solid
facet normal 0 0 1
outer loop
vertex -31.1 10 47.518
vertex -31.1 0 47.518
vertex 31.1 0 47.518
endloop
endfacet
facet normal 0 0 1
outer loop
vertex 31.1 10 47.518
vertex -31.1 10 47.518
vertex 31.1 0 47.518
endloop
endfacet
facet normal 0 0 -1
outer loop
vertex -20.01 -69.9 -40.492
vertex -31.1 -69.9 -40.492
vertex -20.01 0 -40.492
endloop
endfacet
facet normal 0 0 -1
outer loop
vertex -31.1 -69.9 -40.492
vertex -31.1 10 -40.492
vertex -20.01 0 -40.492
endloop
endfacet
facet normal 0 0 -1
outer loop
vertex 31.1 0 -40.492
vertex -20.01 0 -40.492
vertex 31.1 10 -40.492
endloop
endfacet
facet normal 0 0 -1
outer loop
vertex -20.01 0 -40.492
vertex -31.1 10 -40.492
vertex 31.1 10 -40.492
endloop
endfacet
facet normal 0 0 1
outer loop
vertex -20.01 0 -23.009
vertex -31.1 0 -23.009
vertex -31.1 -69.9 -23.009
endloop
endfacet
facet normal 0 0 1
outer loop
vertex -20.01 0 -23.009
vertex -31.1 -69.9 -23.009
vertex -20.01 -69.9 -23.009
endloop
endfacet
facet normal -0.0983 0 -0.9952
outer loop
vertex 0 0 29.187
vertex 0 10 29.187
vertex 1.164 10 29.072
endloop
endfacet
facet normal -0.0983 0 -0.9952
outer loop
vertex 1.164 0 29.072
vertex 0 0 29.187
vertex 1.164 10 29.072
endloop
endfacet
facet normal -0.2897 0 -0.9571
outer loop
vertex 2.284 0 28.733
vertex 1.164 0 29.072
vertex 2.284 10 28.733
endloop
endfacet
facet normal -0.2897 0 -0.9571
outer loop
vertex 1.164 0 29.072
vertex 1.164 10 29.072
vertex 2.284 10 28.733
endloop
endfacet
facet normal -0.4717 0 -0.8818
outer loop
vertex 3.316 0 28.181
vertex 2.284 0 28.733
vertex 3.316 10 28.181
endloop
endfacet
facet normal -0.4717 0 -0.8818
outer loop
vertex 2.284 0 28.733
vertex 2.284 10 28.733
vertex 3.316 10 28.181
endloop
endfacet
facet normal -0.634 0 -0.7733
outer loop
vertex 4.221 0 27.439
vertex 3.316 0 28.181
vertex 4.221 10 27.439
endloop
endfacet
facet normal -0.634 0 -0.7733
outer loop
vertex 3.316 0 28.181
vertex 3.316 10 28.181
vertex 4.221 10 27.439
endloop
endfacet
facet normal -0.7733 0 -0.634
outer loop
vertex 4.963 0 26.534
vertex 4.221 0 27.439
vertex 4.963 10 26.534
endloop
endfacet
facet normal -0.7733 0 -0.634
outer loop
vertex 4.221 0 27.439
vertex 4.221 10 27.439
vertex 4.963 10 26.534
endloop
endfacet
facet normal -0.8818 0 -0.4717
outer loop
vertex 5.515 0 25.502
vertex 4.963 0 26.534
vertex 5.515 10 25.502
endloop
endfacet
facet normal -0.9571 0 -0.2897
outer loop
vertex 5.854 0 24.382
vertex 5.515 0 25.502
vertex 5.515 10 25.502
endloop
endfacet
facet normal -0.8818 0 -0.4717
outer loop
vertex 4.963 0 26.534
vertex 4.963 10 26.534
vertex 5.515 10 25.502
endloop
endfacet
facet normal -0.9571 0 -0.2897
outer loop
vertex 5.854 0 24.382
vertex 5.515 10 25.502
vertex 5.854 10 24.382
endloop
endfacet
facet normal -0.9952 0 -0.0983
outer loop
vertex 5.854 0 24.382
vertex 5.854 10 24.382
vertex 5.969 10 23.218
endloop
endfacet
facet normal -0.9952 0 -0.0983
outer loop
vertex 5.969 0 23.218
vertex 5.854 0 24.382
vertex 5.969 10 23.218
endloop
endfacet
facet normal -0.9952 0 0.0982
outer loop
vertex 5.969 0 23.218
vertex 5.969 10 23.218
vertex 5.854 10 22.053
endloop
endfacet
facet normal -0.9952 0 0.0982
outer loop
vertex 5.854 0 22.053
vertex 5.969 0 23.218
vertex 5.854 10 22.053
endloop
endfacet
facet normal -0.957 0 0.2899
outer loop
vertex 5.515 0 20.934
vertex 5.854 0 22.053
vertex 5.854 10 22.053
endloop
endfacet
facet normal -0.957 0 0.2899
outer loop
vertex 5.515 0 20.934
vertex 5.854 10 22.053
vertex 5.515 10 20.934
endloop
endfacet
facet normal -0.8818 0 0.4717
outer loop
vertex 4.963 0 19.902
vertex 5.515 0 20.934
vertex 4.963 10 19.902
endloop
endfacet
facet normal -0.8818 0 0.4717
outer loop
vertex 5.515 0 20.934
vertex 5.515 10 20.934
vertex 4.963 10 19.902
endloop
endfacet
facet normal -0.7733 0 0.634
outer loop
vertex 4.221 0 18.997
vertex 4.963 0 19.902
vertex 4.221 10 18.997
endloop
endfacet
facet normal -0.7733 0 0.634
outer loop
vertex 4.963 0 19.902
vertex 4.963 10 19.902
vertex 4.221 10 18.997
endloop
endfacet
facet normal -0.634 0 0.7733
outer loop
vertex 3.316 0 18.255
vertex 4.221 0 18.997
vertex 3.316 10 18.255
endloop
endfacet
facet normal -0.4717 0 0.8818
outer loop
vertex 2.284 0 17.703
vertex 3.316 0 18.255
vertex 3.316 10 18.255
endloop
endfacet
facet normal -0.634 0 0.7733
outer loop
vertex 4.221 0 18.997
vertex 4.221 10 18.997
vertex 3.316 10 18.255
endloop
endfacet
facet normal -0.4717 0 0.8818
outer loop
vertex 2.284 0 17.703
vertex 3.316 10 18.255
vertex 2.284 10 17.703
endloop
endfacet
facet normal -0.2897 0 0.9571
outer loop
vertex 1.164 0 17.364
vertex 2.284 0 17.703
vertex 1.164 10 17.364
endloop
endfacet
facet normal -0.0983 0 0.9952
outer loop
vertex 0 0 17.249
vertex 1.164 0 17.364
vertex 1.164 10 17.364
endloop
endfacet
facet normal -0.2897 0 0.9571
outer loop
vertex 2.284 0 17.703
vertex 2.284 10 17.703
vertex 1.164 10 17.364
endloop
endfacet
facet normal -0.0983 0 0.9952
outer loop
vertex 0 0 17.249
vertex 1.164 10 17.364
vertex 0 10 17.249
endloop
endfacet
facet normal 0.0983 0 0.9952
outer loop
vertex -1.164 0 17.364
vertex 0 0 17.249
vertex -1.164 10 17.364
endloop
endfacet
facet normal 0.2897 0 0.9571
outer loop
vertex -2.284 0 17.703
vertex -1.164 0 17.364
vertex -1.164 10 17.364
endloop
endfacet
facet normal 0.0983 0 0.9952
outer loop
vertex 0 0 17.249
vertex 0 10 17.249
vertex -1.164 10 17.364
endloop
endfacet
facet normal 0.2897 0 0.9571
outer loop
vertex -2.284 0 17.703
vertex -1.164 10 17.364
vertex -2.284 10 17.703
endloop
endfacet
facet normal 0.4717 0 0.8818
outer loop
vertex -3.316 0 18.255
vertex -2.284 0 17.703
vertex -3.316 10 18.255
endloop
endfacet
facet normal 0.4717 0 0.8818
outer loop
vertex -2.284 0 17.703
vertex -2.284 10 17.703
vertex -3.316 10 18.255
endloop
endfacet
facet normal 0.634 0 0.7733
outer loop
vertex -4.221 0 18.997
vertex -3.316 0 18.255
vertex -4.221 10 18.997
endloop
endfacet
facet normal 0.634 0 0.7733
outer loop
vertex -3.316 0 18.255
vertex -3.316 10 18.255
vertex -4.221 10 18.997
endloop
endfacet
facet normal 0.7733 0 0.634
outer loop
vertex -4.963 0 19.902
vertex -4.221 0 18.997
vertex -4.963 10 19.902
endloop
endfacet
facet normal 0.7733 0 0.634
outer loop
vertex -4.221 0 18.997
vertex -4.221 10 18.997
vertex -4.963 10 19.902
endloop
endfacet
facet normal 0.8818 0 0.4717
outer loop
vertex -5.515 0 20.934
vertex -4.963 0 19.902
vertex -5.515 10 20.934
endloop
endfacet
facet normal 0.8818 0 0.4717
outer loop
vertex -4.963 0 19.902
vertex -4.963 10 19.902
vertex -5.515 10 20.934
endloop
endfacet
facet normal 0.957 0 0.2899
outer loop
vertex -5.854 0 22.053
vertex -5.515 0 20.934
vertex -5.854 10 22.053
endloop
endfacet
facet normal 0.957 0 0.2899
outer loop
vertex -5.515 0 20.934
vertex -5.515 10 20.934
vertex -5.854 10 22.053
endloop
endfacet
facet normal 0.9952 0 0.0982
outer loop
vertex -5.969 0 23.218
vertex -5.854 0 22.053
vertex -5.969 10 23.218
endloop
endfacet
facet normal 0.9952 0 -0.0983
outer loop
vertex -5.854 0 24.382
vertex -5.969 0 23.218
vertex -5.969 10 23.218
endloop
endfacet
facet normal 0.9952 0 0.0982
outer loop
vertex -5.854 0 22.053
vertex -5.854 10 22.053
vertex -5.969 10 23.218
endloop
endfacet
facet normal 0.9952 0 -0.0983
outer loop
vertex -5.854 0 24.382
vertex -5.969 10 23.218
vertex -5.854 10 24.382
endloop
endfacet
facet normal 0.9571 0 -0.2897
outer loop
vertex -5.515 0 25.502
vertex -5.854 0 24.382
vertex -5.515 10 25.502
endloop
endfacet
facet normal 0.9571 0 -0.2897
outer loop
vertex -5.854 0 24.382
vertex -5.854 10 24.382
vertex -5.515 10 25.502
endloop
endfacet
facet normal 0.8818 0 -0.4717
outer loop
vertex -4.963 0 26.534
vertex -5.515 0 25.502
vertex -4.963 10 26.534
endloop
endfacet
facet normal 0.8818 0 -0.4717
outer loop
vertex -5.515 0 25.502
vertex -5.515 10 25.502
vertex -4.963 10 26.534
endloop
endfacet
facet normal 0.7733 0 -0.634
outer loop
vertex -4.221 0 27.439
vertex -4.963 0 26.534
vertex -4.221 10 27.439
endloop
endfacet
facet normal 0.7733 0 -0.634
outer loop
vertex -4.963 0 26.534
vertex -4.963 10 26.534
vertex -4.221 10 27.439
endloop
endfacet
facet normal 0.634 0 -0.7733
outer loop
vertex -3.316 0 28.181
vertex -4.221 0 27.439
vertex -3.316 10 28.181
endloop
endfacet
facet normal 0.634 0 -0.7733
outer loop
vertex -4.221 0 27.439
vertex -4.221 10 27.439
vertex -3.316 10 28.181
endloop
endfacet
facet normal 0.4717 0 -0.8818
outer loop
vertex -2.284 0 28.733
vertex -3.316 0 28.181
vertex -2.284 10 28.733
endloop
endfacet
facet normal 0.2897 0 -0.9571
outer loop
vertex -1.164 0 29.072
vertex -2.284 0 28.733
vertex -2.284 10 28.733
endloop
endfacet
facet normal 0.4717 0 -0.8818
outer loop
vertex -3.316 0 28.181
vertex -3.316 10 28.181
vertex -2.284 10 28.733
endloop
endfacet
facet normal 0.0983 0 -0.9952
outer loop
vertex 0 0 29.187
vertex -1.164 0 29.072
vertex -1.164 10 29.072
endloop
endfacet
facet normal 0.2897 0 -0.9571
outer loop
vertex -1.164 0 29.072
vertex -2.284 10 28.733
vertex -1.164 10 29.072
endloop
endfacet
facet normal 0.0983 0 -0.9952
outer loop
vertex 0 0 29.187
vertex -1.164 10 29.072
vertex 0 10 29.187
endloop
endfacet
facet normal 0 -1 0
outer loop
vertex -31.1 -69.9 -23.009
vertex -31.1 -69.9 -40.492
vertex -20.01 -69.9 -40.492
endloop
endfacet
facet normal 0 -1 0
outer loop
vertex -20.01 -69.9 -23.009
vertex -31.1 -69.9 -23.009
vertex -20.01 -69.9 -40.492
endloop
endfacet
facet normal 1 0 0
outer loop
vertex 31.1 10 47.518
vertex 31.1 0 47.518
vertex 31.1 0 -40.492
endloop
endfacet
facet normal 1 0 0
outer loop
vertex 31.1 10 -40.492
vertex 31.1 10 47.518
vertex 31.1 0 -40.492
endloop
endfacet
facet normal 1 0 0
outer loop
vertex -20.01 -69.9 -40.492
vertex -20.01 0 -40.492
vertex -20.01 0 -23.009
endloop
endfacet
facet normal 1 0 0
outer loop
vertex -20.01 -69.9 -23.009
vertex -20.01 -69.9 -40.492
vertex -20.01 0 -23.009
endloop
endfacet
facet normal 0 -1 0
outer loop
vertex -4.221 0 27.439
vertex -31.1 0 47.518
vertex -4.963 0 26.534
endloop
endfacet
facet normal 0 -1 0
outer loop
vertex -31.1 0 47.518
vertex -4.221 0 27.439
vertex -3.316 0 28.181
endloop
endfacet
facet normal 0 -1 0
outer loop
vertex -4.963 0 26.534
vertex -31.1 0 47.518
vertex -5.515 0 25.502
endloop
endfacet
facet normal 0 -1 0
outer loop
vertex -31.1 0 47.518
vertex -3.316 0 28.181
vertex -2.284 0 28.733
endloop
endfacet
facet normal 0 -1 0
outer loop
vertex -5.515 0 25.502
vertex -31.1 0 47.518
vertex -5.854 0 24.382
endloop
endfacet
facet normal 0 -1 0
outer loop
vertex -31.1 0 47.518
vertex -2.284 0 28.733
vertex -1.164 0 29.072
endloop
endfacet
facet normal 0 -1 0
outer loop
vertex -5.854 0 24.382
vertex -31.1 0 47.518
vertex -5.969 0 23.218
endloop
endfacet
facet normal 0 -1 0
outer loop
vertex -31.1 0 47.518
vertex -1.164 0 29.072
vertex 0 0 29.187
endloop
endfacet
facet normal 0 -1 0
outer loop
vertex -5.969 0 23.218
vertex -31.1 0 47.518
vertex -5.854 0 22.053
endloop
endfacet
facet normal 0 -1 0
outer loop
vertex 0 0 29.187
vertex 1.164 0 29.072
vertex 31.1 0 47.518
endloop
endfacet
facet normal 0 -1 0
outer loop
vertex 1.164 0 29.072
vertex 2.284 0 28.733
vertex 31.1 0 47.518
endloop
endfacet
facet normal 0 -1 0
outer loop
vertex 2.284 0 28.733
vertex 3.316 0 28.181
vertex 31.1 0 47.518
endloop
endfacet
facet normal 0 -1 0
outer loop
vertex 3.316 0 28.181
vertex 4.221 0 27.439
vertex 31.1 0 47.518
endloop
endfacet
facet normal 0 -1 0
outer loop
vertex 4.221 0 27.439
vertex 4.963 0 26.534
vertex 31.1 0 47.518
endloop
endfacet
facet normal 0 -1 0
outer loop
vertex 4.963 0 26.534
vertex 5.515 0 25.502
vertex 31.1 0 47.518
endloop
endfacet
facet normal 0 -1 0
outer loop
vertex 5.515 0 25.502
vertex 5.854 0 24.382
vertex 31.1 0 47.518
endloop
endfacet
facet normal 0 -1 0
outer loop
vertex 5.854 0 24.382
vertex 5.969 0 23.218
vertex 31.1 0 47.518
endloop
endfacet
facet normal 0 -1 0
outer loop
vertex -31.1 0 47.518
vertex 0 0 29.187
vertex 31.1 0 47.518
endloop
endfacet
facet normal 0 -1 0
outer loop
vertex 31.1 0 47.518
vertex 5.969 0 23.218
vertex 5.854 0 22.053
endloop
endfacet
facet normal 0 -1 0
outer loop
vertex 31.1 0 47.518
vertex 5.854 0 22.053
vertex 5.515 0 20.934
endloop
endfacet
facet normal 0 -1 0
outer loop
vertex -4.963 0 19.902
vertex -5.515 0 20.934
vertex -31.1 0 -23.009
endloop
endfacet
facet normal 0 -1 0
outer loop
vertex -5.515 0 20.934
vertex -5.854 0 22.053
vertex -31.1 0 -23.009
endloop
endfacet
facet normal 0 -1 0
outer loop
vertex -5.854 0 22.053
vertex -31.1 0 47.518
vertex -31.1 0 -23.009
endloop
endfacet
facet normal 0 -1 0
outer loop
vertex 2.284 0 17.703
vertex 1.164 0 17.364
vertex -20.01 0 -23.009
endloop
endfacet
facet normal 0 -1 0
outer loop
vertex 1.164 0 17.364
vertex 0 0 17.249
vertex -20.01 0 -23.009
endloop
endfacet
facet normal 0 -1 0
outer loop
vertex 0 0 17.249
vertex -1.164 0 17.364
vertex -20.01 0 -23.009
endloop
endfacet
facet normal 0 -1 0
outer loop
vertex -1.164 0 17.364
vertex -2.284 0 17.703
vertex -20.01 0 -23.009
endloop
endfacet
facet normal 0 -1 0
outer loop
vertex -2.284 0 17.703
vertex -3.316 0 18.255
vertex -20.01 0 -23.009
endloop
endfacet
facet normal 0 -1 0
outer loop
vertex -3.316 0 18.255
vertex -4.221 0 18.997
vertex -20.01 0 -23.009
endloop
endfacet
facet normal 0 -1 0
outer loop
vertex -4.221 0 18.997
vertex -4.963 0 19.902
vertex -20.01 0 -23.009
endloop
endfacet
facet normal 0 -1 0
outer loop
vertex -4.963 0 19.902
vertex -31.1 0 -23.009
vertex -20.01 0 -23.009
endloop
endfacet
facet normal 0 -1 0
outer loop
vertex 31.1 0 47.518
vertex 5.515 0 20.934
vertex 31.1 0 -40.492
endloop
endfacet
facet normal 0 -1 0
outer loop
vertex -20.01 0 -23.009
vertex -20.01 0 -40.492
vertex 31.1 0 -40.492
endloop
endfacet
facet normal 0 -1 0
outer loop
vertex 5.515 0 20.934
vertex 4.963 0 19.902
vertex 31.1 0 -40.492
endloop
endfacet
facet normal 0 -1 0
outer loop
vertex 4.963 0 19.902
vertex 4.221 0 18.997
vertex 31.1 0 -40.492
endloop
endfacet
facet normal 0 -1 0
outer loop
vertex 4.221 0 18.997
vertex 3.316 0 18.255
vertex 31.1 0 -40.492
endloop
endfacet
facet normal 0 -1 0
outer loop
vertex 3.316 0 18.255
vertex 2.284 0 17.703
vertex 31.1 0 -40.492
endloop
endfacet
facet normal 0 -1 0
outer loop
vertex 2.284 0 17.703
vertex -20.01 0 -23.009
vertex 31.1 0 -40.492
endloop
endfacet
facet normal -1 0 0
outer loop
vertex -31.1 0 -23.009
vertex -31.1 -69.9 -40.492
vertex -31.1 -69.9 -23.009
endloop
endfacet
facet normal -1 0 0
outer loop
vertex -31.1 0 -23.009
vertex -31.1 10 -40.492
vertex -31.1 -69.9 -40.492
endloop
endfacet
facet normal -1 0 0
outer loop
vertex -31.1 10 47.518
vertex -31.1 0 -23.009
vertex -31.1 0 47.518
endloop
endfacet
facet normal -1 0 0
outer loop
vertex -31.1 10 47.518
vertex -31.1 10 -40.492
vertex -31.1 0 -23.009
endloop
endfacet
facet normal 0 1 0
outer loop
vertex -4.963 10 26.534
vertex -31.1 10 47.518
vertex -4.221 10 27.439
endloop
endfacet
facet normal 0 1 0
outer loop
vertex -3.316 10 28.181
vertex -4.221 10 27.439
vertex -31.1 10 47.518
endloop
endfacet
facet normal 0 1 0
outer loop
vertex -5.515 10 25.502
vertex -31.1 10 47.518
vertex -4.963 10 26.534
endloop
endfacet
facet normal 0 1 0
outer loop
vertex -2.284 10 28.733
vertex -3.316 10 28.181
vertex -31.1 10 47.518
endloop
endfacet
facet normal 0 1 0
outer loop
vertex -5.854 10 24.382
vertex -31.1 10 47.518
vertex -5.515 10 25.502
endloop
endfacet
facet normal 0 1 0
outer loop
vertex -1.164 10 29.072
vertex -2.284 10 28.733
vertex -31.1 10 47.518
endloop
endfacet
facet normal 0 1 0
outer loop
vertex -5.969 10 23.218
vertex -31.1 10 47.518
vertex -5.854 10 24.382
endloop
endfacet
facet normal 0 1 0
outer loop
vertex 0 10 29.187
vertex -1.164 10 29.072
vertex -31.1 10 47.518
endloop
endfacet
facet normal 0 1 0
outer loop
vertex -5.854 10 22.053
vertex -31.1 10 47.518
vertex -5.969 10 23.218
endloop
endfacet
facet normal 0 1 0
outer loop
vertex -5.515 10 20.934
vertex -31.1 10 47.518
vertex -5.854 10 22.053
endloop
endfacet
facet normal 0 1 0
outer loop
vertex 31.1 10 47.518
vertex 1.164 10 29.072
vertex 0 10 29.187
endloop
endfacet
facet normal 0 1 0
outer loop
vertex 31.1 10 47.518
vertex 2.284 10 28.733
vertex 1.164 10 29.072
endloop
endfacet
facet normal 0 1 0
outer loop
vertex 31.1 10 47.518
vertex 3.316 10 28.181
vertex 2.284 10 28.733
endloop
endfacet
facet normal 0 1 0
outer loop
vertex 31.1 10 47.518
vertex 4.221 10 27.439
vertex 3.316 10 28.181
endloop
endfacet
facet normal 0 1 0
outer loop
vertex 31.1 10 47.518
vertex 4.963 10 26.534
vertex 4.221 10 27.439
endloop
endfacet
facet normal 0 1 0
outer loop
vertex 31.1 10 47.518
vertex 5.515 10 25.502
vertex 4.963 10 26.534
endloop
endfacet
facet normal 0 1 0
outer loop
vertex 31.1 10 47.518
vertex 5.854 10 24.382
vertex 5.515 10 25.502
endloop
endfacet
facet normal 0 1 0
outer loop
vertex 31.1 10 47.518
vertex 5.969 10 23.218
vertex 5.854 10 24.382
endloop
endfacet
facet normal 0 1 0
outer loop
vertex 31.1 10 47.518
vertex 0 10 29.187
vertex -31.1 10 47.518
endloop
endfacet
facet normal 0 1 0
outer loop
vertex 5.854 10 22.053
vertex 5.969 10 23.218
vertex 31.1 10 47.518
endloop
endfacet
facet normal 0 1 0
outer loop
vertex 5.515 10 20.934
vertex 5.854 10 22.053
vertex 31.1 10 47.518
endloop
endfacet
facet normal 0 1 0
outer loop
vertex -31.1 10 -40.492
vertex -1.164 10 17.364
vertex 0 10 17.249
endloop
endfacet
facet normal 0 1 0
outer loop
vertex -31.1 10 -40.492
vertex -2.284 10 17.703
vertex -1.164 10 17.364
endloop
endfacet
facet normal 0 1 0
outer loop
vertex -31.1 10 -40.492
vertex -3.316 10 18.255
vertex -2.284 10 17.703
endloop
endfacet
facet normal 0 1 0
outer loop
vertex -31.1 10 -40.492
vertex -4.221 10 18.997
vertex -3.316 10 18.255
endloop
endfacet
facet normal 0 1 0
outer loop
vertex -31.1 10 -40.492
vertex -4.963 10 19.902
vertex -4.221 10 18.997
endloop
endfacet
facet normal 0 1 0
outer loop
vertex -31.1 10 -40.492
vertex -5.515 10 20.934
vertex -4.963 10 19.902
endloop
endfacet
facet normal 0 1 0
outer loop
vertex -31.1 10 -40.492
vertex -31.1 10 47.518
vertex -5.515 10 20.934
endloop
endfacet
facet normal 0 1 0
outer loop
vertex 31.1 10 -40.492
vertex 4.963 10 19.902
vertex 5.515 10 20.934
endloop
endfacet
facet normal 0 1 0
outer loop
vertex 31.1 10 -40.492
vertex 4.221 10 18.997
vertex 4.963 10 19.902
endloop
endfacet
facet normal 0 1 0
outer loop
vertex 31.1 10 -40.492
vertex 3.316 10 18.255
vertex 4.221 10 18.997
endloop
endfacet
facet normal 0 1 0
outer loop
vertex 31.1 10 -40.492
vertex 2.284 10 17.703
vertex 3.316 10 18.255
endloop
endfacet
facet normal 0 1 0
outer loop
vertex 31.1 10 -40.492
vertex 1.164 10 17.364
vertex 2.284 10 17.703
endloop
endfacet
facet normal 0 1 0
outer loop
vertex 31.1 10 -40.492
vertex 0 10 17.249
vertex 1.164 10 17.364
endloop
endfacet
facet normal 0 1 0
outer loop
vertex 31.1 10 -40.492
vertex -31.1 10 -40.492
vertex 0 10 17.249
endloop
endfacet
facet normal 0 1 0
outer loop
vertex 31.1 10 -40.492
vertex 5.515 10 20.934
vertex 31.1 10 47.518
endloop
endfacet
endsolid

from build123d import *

# Parameters (mm, degrees)
SKETCH1_W           = 62.2
SKETCH1_H           = 88.01
BOSS_EXTRUDE1_DEPTH = 10
SKETCH2_R           = 5.969
CUT_EXTRUDE1_DEPTH  = 10
SKETCH3_W           = 11.09
SKETCH3_H           = 17.48264
BOSS_EXTRUDE2_DEPTH = 69.9


with BuildPart() as part:
    # Sketch1 → Boss-Extrude1 (new body)
    with BuildSketch(Plane(origin=(0, 0, 0), x_dir=(1, 0, 0), z_dir=(0, 1, 0))):
        with Locations((0, -3.512935)):
            Rectangle(SKETCH1_W, SKETCH1_H)
    extrude(amount=BOSS_EXTRUDE1_DEPTH)

    # Sketch2 → Cut-Extrude1 (cut)
    with BuildSketch(Plane(origin=(0, 10, 0), x_dir=(1, 0, 0), z_dir=(0, 1, 0))):
        with Locations(Location((0, -23.217935, 0), (0, 0, 270))):
            Circle(SKETCH2_R)
    extrude(amount=-CUT_EXTRUDE1_DEPTH, mode=Mode.SUBTRACT)

    # Sketch3 → Boss-Extrude2 (add)
    with BuildSketch(Plane.XZ):
        with Locations((-25.555, -31.750745)):
            Rectangle(SKETCH3_W, SKETCH3_H)
    extrude(amount=BOSS_EXTRUDE2_DEPTH)


solid = part.part
